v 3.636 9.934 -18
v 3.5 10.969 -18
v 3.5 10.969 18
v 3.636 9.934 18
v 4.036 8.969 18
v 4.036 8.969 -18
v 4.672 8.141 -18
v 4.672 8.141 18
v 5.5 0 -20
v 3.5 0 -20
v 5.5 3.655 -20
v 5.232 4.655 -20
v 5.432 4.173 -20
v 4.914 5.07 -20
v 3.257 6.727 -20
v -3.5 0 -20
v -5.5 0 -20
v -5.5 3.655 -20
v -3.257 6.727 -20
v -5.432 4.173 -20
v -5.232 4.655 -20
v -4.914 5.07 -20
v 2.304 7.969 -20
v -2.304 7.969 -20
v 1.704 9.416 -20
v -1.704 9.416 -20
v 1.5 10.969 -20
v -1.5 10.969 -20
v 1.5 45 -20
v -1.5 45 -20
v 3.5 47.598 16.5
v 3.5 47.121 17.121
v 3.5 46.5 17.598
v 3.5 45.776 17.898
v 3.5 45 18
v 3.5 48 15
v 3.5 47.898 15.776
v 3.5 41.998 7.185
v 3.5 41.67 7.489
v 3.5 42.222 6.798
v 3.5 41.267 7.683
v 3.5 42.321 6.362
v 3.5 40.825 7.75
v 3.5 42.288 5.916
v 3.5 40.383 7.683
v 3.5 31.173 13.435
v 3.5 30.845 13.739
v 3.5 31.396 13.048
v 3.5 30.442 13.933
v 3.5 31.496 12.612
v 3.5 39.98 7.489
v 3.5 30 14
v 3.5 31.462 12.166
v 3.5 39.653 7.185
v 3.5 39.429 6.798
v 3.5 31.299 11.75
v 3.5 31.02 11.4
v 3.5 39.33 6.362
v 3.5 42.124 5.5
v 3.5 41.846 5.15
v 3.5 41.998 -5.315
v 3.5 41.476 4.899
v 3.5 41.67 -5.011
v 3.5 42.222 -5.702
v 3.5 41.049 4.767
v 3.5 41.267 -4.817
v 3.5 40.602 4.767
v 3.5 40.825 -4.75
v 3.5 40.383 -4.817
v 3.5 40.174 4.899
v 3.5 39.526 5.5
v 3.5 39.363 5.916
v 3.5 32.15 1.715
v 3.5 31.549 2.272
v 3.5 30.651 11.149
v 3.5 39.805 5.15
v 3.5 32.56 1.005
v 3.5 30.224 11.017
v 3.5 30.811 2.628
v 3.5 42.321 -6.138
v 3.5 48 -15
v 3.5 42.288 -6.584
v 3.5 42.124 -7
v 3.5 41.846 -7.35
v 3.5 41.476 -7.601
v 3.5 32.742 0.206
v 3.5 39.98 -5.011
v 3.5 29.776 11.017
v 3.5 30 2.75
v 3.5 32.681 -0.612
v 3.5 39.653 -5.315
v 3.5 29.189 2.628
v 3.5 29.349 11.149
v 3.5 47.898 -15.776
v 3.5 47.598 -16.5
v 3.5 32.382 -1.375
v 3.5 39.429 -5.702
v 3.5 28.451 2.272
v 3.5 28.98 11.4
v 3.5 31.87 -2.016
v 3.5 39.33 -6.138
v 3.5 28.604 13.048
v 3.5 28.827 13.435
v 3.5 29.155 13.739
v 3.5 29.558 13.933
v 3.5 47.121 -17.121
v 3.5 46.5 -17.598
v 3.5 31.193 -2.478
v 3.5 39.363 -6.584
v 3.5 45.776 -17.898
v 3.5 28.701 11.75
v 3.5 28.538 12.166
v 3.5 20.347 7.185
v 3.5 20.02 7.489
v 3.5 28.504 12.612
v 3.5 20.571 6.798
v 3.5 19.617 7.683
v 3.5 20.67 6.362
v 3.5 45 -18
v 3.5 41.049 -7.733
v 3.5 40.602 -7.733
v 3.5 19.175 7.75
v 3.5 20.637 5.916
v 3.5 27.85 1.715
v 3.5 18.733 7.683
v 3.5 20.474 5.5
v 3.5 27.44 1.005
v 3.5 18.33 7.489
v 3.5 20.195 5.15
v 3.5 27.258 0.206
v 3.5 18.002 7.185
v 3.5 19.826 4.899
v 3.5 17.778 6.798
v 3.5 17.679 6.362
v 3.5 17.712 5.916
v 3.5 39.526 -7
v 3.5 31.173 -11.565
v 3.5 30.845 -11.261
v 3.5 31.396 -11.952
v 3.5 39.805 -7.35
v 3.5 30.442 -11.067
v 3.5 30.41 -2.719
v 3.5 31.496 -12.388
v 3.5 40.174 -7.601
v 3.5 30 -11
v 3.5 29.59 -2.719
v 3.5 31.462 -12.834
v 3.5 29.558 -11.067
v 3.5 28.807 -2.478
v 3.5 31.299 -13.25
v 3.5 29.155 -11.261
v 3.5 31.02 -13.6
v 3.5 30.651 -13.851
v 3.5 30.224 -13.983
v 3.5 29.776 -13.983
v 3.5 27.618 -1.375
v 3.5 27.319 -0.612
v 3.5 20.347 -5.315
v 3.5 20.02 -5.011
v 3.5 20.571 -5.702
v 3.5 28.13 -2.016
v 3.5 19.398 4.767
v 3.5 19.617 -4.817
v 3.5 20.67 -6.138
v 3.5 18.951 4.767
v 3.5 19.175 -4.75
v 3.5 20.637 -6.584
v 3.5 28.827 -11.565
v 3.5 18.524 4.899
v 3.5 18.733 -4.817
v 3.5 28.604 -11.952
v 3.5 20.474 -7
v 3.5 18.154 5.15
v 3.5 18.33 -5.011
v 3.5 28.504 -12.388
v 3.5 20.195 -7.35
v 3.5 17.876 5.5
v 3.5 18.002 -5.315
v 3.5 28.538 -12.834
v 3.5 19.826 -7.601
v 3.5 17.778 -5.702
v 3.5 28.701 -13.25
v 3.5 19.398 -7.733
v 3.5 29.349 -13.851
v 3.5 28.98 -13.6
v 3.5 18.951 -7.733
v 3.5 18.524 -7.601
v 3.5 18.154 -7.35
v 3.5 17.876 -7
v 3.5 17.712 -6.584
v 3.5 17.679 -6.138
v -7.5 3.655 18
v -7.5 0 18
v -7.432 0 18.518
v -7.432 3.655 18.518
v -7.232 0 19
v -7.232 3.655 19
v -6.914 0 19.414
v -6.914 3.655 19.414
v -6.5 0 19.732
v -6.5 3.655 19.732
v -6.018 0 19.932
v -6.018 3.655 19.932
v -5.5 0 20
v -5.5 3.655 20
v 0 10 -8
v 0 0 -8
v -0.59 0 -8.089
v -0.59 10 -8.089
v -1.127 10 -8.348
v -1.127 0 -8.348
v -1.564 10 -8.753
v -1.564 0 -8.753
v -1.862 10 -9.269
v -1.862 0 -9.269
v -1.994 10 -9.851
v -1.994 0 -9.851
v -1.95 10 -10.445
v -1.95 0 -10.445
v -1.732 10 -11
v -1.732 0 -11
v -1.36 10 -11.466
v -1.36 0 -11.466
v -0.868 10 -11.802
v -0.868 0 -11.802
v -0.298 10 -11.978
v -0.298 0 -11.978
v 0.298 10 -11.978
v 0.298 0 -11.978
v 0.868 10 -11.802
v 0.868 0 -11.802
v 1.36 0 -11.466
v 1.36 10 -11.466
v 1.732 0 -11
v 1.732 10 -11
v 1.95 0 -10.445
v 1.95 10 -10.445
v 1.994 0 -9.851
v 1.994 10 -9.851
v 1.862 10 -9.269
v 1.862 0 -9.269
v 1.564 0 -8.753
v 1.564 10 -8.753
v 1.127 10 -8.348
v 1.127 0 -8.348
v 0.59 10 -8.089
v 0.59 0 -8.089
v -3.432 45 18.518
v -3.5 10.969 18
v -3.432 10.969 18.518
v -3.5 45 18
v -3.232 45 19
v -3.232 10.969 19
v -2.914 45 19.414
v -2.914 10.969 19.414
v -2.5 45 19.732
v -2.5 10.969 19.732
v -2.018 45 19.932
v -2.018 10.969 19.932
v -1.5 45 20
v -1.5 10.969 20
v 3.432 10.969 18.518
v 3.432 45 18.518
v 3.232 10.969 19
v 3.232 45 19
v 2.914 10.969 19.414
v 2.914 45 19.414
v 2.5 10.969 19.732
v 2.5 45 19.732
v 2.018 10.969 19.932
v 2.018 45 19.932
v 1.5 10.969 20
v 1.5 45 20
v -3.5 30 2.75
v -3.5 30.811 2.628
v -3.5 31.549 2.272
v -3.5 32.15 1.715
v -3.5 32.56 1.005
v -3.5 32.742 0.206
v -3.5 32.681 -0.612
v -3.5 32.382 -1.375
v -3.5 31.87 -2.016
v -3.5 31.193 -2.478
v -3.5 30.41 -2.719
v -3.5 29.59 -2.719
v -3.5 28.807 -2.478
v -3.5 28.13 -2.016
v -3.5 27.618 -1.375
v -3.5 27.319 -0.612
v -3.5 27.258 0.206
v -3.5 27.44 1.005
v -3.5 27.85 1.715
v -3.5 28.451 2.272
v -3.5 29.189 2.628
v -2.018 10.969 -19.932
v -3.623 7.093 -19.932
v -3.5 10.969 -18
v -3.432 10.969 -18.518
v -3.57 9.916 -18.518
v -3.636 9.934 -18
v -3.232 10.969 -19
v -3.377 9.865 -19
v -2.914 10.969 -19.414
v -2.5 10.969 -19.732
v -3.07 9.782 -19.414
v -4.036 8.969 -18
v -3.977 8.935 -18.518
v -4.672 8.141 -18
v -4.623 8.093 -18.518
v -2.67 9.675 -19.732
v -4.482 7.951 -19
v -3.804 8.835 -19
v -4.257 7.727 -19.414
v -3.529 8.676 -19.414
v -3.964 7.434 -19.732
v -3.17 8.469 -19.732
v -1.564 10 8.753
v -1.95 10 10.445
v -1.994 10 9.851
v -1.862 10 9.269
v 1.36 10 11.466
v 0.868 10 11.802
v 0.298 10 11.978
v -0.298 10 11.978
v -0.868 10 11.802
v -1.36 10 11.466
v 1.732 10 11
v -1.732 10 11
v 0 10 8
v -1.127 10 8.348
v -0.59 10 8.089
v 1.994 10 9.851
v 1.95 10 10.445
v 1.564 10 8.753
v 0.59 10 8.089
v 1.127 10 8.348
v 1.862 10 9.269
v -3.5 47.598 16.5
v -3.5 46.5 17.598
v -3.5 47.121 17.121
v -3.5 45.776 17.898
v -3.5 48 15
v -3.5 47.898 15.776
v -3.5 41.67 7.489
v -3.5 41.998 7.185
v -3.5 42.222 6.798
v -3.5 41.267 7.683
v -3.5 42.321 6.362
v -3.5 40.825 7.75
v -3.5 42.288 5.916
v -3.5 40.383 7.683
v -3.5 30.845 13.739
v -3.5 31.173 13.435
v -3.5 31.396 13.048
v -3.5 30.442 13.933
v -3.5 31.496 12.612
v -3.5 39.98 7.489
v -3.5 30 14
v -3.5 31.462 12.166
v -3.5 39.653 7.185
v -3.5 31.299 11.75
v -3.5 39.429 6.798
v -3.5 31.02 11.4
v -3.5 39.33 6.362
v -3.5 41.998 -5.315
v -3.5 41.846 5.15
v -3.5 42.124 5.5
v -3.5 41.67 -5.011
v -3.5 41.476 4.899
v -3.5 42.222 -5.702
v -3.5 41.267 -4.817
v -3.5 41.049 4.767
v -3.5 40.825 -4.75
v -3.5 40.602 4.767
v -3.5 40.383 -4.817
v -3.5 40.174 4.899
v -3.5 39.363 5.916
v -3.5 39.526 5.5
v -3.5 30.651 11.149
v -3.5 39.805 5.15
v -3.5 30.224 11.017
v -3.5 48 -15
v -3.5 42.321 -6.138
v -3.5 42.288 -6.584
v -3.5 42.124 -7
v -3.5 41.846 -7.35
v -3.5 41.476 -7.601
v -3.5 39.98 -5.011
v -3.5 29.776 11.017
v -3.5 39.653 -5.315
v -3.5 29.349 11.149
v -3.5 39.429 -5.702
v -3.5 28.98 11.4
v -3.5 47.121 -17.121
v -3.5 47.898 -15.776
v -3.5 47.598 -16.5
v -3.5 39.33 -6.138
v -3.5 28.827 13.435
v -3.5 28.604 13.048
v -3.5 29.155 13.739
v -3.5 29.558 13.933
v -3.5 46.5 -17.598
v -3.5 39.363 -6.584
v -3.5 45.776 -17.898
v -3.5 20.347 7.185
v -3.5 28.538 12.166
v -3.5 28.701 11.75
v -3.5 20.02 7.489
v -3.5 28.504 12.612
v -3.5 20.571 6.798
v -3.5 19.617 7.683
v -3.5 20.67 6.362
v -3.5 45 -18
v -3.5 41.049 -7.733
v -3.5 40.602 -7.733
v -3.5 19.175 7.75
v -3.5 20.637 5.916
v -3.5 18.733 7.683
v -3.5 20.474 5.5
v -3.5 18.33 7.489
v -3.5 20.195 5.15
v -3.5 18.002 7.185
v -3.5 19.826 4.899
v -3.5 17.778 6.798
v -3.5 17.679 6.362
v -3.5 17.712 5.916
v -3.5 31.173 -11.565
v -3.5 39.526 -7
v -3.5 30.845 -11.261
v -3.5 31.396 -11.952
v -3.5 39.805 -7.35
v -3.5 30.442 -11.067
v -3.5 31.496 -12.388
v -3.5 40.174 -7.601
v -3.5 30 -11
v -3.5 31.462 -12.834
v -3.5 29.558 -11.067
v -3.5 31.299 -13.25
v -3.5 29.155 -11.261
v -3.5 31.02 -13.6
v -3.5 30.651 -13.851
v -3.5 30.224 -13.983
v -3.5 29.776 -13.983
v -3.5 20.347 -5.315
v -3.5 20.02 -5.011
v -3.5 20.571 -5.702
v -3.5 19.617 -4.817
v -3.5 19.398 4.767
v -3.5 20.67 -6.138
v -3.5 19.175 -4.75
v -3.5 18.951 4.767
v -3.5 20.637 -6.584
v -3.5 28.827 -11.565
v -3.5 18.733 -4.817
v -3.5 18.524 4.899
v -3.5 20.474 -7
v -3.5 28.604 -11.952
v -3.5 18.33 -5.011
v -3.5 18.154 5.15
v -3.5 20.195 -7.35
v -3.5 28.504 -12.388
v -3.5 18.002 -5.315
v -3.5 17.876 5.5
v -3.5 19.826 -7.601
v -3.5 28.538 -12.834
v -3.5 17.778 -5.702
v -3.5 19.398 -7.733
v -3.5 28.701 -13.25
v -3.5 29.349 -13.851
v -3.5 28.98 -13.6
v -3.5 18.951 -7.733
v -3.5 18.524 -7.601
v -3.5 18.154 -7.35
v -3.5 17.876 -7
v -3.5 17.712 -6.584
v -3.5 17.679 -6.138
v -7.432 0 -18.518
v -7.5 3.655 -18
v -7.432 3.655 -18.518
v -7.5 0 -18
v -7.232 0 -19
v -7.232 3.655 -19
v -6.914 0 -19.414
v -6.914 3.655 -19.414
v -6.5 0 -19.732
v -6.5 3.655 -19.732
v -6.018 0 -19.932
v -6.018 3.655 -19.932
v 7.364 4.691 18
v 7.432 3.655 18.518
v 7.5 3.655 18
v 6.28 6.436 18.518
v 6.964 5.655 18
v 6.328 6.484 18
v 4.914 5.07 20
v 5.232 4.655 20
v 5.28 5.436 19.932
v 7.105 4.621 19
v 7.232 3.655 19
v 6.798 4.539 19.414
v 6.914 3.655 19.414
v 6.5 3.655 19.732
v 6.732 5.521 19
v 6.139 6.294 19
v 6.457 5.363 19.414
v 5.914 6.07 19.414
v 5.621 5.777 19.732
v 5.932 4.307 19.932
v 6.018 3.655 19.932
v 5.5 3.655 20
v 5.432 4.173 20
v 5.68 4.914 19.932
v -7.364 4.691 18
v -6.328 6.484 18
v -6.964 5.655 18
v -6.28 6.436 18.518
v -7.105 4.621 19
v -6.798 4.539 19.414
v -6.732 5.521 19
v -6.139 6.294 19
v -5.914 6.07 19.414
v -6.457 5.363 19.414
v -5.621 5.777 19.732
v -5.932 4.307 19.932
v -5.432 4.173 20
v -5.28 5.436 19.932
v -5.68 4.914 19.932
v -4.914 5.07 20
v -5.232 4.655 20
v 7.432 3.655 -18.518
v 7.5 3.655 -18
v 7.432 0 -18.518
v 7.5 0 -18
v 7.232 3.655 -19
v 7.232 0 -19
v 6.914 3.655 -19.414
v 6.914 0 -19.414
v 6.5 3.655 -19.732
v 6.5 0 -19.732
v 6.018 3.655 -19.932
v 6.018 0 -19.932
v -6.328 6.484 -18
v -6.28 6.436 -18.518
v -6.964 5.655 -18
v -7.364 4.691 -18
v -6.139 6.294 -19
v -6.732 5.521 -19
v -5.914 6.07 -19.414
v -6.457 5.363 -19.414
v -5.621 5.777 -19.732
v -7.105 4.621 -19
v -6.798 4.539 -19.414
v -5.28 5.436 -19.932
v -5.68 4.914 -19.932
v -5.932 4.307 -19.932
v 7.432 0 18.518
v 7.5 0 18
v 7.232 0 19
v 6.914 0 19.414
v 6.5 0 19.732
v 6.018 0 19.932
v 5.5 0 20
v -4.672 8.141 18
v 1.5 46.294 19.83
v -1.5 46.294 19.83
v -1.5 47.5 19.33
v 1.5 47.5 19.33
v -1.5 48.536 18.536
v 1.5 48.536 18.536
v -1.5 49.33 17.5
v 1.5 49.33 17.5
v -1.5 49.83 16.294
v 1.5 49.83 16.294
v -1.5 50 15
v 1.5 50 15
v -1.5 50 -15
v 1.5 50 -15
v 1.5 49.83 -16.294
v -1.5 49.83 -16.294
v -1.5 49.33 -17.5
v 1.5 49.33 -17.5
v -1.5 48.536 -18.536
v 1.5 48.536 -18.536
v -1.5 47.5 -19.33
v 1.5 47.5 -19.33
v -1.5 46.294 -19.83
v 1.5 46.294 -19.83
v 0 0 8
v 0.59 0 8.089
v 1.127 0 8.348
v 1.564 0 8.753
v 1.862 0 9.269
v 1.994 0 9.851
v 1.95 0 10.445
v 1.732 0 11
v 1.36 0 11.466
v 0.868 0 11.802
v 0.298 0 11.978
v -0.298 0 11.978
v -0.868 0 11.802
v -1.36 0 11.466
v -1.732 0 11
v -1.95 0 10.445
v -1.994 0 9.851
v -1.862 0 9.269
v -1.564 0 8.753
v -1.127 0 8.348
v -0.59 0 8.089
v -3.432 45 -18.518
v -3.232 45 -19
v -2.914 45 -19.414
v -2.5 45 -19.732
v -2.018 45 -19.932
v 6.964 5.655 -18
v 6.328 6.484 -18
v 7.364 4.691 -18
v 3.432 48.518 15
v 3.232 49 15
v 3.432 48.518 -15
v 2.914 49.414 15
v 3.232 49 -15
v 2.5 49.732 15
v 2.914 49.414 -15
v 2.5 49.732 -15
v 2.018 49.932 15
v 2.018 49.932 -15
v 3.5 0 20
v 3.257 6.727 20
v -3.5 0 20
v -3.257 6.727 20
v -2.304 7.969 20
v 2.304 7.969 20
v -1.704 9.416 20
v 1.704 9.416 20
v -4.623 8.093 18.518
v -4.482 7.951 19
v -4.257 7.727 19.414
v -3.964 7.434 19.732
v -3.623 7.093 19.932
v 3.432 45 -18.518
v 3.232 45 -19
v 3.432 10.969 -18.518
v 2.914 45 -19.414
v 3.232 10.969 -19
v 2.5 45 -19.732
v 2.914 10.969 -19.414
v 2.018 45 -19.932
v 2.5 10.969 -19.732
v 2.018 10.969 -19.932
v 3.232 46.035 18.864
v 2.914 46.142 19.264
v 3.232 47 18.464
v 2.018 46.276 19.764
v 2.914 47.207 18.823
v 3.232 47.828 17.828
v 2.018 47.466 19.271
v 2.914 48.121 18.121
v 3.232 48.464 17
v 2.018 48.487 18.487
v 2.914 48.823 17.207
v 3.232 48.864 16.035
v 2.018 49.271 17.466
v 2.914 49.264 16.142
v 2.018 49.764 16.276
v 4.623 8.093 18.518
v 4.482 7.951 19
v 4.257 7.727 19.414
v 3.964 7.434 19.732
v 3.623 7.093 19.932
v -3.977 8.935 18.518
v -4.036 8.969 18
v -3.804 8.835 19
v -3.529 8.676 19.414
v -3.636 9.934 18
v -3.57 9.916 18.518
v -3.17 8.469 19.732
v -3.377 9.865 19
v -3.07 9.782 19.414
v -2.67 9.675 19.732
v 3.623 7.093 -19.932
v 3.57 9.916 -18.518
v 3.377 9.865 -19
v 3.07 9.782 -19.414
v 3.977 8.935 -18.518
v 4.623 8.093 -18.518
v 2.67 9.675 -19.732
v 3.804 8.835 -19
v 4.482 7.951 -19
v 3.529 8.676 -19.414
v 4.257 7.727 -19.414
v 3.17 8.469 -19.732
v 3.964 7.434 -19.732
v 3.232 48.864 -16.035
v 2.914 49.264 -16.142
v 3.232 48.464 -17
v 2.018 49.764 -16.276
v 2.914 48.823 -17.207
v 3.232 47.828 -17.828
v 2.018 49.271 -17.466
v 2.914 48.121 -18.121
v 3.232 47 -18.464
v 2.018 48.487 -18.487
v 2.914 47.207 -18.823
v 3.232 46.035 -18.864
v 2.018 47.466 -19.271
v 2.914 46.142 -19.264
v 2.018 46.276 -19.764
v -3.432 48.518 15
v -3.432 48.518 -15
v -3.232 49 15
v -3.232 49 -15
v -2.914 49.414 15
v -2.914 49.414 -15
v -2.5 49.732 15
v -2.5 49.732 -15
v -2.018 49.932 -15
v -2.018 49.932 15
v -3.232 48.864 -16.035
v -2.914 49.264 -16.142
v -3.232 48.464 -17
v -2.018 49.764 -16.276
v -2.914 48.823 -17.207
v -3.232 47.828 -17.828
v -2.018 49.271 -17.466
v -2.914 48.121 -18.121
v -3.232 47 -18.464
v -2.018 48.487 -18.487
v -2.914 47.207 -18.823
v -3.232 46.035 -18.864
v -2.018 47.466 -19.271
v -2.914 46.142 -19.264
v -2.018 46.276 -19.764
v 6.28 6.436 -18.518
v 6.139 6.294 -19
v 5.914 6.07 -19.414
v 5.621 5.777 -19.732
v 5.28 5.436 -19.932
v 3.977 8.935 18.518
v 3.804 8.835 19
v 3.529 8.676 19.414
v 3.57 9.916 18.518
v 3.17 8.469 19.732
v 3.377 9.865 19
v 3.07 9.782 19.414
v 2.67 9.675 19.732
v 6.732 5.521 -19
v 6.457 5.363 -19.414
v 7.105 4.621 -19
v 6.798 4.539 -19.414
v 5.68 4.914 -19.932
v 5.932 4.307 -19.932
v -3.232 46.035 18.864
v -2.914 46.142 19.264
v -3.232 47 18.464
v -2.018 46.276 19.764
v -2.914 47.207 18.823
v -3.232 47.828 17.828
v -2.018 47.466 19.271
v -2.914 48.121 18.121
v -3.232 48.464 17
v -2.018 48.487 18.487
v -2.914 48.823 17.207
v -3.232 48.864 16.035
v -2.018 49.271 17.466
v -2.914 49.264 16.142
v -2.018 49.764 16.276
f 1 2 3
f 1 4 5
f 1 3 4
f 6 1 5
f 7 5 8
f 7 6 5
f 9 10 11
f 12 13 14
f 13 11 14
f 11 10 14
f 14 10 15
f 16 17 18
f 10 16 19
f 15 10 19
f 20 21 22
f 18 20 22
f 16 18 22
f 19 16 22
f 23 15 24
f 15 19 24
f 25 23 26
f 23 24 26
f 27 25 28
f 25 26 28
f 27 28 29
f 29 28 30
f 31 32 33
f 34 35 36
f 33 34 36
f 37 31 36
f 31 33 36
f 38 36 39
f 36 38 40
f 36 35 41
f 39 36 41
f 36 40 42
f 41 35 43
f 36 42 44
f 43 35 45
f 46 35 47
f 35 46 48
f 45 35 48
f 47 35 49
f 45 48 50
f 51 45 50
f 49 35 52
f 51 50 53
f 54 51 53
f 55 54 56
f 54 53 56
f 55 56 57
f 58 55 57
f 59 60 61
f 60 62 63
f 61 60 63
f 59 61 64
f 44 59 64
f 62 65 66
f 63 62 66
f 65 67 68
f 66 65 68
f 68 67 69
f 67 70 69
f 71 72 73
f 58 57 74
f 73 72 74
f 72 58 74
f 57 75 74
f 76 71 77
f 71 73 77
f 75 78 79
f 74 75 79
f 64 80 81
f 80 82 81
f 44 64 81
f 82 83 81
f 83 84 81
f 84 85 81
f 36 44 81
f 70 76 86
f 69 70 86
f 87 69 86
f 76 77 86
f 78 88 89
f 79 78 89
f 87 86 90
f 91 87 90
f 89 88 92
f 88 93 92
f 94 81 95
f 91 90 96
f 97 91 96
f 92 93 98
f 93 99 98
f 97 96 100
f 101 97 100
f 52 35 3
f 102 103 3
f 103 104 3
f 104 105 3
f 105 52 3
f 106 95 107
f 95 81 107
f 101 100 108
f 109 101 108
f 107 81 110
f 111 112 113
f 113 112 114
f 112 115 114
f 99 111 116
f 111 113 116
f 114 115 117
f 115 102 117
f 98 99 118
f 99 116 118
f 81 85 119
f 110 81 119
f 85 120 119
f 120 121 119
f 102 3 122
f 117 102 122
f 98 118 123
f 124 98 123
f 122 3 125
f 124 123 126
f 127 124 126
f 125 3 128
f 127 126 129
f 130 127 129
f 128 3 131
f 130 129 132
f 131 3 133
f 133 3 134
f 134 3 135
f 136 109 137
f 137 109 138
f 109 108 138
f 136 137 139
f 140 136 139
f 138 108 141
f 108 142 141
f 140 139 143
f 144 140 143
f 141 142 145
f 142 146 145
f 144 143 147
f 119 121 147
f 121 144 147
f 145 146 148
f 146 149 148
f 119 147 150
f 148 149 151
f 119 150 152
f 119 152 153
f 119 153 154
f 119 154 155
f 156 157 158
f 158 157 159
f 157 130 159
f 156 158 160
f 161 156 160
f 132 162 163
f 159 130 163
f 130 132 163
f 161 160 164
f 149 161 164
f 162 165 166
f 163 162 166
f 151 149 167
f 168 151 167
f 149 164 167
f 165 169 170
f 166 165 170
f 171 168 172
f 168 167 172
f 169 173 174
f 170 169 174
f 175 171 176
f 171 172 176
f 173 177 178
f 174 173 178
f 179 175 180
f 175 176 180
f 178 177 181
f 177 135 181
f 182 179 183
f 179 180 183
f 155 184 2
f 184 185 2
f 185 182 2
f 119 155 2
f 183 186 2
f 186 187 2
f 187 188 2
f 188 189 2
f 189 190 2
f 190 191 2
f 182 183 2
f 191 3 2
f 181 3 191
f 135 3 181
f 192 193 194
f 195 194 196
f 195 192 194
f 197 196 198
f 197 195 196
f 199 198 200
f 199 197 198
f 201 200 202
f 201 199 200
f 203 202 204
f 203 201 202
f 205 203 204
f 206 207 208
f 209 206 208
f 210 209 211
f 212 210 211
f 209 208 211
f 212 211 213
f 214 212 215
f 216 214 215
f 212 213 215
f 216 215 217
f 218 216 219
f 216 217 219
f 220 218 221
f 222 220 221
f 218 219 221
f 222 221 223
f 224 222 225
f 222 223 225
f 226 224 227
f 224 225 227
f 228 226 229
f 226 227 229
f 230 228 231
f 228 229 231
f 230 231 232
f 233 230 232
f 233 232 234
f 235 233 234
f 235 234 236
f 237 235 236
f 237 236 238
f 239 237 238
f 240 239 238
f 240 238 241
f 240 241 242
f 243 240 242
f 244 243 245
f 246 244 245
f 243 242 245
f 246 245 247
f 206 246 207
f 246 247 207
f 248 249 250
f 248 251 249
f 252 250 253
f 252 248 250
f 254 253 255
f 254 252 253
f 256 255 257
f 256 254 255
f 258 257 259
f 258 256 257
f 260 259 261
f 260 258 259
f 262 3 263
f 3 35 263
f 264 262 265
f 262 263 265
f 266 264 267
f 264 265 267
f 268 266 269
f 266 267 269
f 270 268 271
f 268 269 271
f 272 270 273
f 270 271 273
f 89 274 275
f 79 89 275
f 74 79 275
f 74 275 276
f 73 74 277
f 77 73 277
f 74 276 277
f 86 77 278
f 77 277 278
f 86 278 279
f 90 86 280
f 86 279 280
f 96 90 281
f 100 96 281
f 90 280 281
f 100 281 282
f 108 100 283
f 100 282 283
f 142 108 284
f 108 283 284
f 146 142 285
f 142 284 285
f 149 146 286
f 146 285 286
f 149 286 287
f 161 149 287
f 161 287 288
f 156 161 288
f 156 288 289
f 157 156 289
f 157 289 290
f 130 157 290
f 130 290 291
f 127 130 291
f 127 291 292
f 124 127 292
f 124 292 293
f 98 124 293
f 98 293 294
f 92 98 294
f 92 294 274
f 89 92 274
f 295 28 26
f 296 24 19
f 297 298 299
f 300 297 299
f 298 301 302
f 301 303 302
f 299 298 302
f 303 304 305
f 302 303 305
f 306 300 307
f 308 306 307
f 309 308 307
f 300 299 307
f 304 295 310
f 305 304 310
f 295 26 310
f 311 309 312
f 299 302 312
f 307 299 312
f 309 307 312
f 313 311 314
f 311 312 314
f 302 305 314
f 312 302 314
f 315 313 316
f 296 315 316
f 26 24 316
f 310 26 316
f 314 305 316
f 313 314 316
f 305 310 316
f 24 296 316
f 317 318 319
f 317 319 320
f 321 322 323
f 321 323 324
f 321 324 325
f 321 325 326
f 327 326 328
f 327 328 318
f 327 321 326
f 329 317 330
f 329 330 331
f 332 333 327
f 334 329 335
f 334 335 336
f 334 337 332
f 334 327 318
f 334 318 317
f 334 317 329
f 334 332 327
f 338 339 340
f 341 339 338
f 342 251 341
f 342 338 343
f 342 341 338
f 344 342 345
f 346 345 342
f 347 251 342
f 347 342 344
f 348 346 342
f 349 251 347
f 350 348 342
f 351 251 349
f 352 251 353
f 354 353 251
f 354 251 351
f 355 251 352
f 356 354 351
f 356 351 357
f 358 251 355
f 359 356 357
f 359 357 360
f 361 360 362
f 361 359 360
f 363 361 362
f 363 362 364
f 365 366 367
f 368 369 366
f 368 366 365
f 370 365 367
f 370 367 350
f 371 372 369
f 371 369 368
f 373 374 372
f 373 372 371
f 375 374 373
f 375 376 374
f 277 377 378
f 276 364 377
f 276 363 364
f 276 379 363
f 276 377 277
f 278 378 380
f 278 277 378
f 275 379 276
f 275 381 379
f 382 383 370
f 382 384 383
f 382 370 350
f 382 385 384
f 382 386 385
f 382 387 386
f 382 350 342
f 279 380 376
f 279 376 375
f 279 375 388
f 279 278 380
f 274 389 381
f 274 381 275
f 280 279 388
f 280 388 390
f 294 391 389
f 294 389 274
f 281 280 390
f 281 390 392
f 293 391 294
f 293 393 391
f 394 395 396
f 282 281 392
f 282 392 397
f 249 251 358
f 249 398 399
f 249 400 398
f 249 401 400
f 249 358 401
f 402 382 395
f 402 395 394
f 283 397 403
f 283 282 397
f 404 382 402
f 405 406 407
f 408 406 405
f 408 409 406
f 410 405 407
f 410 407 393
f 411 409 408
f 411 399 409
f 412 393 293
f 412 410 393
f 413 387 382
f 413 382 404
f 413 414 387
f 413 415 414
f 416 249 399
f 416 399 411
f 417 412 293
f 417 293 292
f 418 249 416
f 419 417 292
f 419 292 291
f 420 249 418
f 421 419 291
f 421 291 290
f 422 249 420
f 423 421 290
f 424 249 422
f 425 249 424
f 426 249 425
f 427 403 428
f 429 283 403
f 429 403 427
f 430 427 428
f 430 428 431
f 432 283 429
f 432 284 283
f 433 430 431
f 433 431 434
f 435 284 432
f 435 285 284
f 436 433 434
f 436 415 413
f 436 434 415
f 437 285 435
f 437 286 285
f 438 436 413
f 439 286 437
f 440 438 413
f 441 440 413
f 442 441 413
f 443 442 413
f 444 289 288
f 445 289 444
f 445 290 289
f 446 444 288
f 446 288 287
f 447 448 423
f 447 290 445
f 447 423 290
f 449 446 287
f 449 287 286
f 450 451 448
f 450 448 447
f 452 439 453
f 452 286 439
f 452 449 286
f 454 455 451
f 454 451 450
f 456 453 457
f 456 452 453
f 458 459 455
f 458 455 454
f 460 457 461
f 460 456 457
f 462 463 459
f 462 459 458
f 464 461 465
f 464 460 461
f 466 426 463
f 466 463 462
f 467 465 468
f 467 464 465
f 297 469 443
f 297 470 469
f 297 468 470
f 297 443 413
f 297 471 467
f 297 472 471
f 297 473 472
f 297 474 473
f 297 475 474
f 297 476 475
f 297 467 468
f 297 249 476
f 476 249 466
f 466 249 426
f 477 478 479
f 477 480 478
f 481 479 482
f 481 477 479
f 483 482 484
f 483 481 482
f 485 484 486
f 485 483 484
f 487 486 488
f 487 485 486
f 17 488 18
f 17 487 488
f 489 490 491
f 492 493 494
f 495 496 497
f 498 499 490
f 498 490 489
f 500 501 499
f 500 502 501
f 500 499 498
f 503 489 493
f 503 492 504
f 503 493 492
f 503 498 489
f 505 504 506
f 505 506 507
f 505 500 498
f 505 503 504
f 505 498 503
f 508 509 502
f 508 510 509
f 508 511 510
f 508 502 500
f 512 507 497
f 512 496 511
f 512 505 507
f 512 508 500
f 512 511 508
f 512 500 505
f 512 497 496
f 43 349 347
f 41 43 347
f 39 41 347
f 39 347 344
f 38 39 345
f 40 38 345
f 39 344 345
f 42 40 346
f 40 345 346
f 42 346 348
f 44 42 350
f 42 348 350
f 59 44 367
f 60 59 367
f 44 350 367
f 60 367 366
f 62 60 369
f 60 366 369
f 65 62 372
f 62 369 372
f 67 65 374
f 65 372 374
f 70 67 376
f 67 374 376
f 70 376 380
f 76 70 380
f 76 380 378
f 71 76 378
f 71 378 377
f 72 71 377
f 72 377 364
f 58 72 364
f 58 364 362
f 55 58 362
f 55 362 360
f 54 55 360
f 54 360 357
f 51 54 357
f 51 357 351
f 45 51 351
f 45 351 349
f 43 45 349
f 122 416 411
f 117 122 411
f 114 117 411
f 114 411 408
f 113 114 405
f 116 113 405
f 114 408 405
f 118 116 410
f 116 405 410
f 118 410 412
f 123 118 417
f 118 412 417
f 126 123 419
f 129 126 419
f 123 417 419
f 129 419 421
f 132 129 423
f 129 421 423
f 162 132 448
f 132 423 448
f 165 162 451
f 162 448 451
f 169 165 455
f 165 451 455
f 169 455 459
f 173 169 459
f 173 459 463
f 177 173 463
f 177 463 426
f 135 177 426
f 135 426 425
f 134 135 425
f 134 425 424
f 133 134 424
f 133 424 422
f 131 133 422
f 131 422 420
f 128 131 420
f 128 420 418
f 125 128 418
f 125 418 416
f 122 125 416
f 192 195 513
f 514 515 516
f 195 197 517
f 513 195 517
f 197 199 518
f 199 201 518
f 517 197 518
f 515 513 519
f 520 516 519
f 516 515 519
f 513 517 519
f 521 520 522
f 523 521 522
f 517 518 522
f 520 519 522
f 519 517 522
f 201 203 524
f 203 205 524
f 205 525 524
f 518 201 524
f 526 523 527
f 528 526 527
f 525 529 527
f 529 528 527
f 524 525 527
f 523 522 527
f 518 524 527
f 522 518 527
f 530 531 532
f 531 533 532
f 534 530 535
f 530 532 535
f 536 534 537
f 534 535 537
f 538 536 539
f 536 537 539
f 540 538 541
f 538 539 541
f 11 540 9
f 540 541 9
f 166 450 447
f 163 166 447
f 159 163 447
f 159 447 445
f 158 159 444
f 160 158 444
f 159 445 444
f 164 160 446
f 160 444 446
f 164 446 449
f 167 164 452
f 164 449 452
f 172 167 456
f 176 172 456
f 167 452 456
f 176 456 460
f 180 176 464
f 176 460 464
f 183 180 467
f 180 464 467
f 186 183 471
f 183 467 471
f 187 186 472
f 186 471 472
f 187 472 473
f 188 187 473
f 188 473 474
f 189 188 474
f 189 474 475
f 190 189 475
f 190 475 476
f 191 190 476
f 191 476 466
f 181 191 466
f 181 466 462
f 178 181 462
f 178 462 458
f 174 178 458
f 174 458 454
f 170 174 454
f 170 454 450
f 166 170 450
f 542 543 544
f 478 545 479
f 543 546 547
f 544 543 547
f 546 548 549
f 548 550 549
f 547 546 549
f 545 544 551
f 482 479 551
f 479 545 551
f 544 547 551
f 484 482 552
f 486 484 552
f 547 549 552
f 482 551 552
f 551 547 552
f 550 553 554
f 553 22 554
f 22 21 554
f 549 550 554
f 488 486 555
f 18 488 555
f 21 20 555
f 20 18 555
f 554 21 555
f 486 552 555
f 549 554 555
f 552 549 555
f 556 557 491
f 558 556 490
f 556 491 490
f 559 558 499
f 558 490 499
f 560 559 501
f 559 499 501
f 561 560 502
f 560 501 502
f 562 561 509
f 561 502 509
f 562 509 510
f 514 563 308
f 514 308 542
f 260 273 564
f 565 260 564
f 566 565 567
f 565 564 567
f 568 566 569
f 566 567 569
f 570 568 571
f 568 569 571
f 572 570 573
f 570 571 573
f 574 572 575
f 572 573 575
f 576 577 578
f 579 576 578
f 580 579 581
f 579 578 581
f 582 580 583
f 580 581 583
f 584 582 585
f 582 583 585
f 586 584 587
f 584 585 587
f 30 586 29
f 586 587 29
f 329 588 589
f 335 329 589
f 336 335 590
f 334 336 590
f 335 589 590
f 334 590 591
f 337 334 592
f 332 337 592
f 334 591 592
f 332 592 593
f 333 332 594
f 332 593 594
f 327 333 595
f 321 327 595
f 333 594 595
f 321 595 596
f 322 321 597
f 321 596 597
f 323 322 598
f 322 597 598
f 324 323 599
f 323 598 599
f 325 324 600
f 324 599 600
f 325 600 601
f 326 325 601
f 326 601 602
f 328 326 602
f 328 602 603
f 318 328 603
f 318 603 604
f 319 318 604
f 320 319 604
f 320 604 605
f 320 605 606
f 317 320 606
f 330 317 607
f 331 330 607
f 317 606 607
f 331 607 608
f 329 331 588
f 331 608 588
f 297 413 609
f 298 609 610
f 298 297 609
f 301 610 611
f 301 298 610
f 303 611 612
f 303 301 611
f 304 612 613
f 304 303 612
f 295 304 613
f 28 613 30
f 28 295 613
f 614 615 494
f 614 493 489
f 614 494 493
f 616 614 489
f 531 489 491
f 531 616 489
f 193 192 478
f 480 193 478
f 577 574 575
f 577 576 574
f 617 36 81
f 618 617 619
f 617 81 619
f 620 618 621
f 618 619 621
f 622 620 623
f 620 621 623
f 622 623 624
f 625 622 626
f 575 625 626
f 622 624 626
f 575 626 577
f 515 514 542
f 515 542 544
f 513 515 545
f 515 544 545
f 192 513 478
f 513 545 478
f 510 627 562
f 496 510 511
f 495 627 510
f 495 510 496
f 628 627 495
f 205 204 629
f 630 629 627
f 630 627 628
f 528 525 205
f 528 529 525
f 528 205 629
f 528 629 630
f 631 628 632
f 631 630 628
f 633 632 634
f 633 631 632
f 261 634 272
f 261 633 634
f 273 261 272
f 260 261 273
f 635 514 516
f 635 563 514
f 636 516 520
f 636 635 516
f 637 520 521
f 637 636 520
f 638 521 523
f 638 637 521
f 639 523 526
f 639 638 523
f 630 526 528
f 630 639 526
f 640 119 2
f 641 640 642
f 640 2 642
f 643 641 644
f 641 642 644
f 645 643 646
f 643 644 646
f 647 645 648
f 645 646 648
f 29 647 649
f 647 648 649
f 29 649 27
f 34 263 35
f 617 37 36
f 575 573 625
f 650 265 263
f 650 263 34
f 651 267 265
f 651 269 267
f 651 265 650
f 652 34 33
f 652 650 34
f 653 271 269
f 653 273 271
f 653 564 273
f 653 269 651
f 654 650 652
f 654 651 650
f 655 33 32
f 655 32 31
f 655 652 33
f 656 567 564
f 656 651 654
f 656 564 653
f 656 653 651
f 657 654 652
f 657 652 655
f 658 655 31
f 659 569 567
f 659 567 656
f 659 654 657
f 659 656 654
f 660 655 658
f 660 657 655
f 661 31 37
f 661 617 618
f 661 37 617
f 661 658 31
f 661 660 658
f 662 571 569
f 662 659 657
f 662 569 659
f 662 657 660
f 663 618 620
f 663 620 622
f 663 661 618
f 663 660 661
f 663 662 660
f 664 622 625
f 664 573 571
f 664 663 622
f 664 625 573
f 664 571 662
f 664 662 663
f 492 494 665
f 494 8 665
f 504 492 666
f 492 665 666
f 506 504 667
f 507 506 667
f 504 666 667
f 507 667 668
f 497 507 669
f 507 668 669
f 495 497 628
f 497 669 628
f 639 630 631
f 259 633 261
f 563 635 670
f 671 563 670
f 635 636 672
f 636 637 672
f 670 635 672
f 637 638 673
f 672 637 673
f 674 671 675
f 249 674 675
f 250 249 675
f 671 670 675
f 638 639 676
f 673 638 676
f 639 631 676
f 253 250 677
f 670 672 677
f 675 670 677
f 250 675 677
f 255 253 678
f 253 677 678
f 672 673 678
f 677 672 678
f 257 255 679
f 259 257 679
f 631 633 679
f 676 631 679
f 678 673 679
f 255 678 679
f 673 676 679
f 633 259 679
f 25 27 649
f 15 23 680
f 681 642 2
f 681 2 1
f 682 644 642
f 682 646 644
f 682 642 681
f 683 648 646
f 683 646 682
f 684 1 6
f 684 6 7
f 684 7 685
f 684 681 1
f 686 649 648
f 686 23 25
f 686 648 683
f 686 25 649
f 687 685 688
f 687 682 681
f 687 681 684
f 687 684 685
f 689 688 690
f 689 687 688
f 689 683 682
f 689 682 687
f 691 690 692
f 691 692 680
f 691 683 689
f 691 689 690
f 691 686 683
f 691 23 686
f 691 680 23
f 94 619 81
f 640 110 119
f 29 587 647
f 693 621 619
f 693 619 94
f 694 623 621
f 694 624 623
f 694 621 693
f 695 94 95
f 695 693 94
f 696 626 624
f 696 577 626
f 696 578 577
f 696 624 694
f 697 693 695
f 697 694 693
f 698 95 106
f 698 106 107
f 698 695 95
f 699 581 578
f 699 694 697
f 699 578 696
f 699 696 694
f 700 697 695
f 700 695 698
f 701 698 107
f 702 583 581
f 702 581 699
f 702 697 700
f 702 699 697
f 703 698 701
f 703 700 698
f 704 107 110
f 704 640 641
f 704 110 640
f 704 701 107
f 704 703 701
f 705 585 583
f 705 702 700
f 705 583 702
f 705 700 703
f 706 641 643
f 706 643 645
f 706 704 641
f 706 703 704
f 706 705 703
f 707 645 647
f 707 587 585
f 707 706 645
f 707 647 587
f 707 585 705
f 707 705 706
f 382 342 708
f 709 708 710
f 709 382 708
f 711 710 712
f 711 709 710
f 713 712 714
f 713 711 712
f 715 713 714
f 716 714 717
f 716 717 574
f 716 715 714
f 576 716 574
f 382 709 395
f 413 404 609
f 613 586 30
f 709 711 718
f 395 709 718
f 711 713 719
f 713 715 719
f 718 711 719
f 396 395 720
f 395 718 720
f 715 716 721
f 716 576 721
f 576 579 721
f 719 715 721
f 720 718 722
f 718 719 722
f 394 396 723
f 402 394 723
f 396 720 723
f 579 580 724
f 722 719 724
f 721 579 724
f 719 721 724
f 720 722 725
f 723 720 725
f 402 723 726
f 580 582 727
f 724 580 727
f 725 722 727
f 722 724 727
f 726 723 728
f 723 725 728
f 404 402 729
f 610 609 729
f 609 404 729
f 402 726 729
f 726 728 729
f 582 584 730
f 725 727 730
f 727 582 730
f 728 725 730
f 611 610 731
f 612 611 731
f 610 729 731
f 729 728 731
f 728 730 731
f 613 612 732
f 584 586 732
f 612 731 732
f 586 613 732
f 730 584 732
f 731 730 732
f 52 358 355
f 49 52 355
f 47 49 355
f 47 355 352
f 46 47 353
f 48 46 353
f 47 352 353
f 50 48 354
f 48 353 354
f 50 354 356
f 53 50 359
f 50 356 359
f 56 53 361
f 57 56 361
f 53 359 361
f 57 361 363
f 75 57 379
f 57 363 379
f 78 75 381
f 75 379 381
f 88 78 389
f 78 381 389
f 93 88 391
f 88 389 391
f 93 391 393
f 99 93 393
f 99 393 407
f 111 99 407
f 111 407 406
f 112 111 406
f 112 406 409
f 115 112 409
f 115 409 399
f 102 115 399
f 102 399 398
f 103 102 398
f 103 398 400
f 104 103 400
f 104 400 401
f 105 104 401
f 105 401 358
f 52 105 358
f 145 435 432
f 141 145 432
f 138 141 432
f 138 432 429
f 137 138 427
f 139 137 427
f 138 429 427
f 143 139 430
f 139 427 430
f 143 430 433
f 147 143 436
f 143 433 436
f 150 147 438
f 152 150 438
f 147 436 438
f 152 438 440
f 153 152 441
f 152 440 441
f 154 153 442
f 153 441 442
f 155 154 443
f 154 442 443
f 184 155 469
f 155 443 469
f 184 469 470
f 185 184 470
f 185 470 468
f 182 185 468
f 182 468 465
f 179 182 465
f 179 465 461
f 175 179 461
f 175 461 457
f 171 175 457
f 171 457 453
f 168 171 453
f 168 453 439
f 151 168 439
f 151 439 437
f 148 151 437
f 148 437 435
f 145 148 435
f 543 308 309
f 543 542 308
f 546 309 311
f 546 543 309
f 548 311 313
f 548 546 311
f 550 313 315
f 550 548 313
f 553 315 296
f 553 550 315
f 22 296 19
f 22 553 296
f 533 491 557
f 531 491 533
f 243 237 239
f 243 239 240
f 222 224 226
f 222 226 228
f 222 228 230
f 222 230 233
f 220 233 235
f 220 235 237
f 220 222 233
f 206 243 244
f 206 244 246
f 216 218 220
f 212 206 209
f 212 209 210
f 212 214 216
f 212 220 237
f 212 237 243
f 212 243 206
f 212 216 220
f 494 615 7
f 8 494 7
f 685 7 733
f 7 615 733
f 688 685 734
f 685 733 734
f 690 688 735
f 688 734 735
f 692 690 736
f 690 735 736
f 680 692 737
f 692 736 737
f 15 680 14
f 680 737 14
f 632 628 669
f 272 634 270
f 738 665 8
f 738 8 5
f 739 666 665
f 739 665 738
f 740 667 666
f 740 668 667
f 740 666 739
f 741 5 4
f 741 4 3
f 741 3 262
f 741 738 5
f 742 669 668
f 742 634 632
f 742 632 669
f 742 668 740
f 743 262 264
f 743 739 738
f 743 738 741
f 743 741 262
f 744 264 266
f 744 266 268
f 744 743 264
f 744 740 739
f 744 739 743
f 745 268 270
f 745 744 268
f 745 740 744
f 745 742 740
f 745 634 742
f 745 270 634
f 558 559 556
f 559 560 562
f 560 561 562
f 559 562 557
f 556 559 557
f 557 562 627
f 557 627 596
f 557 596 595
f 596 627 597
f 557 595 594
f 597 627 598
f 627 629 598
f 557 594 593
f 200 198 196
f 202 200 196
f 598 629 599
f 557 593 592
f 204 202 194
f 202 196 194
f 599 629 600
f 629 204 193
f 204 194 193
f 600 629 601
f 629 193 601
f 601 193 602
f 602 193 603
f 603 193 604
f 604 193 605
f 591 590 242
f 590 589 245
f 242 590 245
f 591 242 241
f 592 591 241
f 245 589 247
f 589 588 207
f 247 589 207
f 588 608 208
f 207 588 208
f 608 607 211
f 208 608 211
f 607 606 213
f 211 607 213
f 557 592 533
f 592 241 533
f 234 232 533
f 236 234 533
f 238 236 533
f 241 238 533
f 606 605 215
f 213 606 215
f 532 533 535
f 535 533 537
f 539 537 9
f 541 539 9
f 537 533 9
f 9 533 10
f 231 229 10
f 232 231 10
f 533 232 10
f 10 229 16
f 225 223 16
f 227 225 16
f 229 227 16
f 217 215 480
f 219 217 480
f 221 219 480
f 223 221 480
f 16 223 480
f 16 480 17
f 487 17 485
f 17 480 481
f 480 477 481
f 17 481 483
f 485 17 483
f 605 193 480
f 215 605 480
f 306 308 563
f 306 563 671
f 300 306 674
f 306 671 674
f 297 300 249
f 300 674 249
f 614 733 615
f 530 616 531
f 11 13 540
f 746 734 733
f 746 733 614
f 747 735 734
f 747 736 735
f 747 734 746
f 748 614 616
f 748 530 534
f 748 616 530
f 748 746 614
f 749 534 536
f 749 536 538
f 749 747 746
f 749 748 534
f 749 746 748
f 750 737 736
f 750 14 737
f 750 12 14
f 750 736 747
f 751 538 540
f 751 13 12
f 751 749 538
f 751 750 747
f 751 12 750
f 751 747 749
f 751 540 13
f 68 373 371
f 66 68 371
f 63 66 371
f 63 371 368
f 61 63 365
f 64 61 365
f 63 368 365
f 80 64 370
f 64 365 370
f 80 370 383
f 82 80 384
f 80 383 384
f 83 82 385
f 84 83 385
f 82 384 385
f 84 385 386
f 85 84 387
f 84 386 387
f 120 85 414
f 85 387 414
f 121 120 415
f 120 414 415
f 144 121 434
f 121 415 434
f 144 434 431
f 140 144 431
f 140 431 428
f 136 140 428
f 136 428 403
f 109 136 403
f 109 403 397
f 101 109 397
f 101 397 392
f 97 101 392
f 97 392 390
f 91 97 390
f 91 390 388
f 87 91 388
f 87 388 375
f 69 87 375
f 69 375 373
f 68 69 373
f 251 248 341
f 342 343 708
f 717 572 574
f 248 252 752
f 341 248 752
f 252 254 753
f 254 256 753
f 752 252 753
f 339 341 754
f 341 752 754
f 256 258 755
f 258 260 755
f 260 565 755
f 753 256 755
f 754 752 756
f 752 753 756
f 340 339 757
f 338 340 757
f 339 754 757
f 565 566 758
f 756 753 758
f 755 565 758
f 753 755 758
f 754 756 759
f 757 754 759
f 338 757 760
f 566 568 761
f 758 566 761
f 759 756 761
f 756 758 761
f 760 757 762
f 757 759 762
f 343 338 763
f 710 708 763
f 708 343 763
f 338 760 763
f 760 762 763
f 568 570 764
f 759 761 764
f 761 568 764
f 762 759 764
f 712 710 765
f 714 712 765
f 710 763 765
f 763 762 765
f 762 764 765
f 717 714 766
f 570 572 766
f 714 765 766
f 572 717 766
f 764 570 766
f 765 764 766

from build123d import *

# Parameters (mm, degrees)
SKETCH1_W                = 7
SKETCH1_H                = 40
BOSS_EXTRUDE1_DEPTH      = 50
BOSS_EXTRUDE2_DEPTH      = 4
BOSS_EXTRUDE2_DEPTH_BACK = 11
SKETCH3_W                = 40
SKETCH3_H                = 12.312299815
CHAMFER1_SIZE            = 7
FILLET1_R                = 4
SKETCH4_R                = 2
CUT_EXTRUDE2_DEPTH       = 10
SKETCH5_R                = 1.5
SKETCH5_R_2              = 2.75
CUT_EXTRUDE3_DEPTH       = 55.963624335
FILLET2_R                = 5
FILLET3_R                = 2


with BuildPart() as part:
    # Sketch1 → Boss-Extrude1 (new body)
    with BuildSketch(Plane(origin=(0, 0, 0), x_dir=(1, 0, 0), z_dir=(0, 1, 0))):
        Rectangle(SKETCH1_W, SKETCH1_H)
    extrude(amount=BOSS_EXTRUDE1_DEPTH)

    # Sketch3 → Boss-Extrude2 (add, two sides: drawn at the far end of the back side and taken through both)
    with BuildSketch(Plane(origin=(3.5, 0, 0), x_dir=(0, 0, -1), z_dir=(1, 0, 0)).offset(-BOSS_EXTRUDE2_DEPTH_BACK)):
        with Locations((0, 6.156149908)):
            Rectangle(SKETCH3_W, SKETCH3_H)
    extrude(amount=BOSS_EXTRUDE2_DEPTH + BOSS_EXTRUDE2_DEPTH_BACK)

    # Chamfer1
    # the kernel refuses this chamfer: 7 mm, written as the material it takes off along each edge
    with BuildSketch(Plane(origin=(-7.5, 12.312299815, 38.001780916), x_dir=(0.9996219169112968, 0.027495876610586365, 0), z_dir=(0, 0, -1))) as chamfer1_piece_1_section:
        Polygon((CHAMFER1_SIZE * 0.999621916911, CHAMFER1_SIZE * 0.0274958766106), (-CHAMFER1_SIZE * 0.0274958766106, CHAMFER1_SIZE * 0.999621916911), (0, 0), align=None)
    chamfer1_piece_1 = extrude(amount=76.003561832, mode=Mode.PRIVATE)
    chamfer1_piece_1 = split(chamfer1_piece_1, bisect_by=Plane(origin=(-3.5, 9.652025222, 0), z_dir=(-1, 0, 0)), keep=Keep.TOP, mode=Mode.PRIVATE)
    add(chamfer1_piece_1, mode=Mode.SUBTRACT)
    with BuildSketch(Plane(origin=(7.5, 12.312299815, 38.001780916), x_dir=(0.027495876610586365, -0.9996219169112968, 0), z_dir=(0, 0, -1))) as chamfer1_piece_2_section:
        Polygon((CHAMFER1_SIZE * 0.999621916911, CHAMFER1_SIZE * 0.0274958766106), (-CHAMFER1_SIZE * 0.0274958766106, CHAMFER1_SIZE * 0.999621916911), (0, 0), align=None)
    chamfer1_piece_2 = extrude(amount=76.003561832, mode=Mode.PRIVATE)
    chamfer1_piece_2 = split(chamfer1_piece_2, bisect_by=Plane(origin=(3.5, 9.652025222, 0), z_dir=(1, 0, 0)), keep=Keep.TOP, mode=Mode.PRIVATE)
    add(chamfer1_piece_2, mode=Mode.SUBTRACT)

    # Fillet1
    fillet1_edges = [part.edges().sort_by_distance(p)[0] for p in [
        (-7.5, 5.312299815, 0),
        (7.5, 5.312299815, 0),
        (-3.5, 9.312299815, 0),
        (3.5, 9.312299815, 0),
    ]]
    fillet(fillet1_edges, radius=FILLET1_R)

    # Sketch4 → Cut-Extrude2 (cut)
    with BuildSketch(Plane.XZ):
        with Locations(Location((0, 10, 0), (0, 0, 270))):
            Circle(SKETCH4_R)
        with Locations(Location((0, -10, 0), (0, 0, 90))):
            Circle(SKETCH4_R)
    extrude(amount=-CUT_EXTRUDE2_DEPTH, mode=Mode.SUBTRACT)

    # Sketch5 → Cut-Extrude3 (cut, through all)
    with BuildSketch(Plane.ZY.offset(3.5)):
        with Locations((-12.5, 30)):
            Circle(SKETCH5_R)
        with Locations((-6.25, 40.825317547)):
            Circle(SKETCH5_R)
        with Locations((6.25, 40.825317547)):
            Circle(SKETCH5_R)
        with Locations((12.5, 30)):
            Circle(SKETCH5_R)
        with Locations((6.25, 19.174682453)):
            Circle(SKETCH5_R)
        with Locations((-6.25, 19.174682453)):
            Circle(SKETCH5_R)
        with Locations((0, 30)):
            Circle(SKETCH5_R_2)
    extrude(amount=-CUT_EXTRUDE3_DEPTH, mode=Mode.SUBTRACT)

    # Fillet2
    fillet2_edges = [part.edges().sort_by_distance(p)[0] for p in [
        (0, 50, 20),
        (0, 50, -20),
    ]]
    fillet(fillet2_edges, radius=FILLET2_R)

    # Fillet3
    fillet3_edges = [part.edges().sort_by_distance(p)[0] for p in [
        (3.5, 50, 0),
        (-3.5, 50, 0),
        (-3.5, 27.984577032, -20),
        (-3.5, 27.984577032, 20),
        (-3.5, 48.535533906, 18.535533906),
        (-3.5, 48.535533906, -18.535533906),
        (3.5, 27.984577032, -20),
        (3.5, 27.984577032, 20),
        (3.5, 48.535533906, 18.535533906),
        (3.5, 48.535533906, -18.535533906),
        (-7.5, 1.827722783, -20),
        (7.5, 1.827722783, -20),
        (7.5, 1.827722783, 20),
        (-5.5, 7.312299815, 20),
        (-7.5, 1.827722783, 20),
        (5.5, 7.312299815, 20),
        (-7.19551813, 5.186179295, 20),
        (7.19551813, 5.186179295, 20),
        (5.5, 7.312299815, -20),
        (-5.5, 7.312299815, -20),
        (-7.19551813, 5.186179295, -20),
        (7.19551813, 5.186179295, -20),
        (-3.80448187, 9.438420335, 20),
        (-3.80448187, 9.438420335, -20),
        (3.80448187, 9.438420335, -20),
        (3.80448187, 9.438420335, 20),
    ]]
    fillet(fillet3_edges, radius=FILLET3_R)


solid = part.part
